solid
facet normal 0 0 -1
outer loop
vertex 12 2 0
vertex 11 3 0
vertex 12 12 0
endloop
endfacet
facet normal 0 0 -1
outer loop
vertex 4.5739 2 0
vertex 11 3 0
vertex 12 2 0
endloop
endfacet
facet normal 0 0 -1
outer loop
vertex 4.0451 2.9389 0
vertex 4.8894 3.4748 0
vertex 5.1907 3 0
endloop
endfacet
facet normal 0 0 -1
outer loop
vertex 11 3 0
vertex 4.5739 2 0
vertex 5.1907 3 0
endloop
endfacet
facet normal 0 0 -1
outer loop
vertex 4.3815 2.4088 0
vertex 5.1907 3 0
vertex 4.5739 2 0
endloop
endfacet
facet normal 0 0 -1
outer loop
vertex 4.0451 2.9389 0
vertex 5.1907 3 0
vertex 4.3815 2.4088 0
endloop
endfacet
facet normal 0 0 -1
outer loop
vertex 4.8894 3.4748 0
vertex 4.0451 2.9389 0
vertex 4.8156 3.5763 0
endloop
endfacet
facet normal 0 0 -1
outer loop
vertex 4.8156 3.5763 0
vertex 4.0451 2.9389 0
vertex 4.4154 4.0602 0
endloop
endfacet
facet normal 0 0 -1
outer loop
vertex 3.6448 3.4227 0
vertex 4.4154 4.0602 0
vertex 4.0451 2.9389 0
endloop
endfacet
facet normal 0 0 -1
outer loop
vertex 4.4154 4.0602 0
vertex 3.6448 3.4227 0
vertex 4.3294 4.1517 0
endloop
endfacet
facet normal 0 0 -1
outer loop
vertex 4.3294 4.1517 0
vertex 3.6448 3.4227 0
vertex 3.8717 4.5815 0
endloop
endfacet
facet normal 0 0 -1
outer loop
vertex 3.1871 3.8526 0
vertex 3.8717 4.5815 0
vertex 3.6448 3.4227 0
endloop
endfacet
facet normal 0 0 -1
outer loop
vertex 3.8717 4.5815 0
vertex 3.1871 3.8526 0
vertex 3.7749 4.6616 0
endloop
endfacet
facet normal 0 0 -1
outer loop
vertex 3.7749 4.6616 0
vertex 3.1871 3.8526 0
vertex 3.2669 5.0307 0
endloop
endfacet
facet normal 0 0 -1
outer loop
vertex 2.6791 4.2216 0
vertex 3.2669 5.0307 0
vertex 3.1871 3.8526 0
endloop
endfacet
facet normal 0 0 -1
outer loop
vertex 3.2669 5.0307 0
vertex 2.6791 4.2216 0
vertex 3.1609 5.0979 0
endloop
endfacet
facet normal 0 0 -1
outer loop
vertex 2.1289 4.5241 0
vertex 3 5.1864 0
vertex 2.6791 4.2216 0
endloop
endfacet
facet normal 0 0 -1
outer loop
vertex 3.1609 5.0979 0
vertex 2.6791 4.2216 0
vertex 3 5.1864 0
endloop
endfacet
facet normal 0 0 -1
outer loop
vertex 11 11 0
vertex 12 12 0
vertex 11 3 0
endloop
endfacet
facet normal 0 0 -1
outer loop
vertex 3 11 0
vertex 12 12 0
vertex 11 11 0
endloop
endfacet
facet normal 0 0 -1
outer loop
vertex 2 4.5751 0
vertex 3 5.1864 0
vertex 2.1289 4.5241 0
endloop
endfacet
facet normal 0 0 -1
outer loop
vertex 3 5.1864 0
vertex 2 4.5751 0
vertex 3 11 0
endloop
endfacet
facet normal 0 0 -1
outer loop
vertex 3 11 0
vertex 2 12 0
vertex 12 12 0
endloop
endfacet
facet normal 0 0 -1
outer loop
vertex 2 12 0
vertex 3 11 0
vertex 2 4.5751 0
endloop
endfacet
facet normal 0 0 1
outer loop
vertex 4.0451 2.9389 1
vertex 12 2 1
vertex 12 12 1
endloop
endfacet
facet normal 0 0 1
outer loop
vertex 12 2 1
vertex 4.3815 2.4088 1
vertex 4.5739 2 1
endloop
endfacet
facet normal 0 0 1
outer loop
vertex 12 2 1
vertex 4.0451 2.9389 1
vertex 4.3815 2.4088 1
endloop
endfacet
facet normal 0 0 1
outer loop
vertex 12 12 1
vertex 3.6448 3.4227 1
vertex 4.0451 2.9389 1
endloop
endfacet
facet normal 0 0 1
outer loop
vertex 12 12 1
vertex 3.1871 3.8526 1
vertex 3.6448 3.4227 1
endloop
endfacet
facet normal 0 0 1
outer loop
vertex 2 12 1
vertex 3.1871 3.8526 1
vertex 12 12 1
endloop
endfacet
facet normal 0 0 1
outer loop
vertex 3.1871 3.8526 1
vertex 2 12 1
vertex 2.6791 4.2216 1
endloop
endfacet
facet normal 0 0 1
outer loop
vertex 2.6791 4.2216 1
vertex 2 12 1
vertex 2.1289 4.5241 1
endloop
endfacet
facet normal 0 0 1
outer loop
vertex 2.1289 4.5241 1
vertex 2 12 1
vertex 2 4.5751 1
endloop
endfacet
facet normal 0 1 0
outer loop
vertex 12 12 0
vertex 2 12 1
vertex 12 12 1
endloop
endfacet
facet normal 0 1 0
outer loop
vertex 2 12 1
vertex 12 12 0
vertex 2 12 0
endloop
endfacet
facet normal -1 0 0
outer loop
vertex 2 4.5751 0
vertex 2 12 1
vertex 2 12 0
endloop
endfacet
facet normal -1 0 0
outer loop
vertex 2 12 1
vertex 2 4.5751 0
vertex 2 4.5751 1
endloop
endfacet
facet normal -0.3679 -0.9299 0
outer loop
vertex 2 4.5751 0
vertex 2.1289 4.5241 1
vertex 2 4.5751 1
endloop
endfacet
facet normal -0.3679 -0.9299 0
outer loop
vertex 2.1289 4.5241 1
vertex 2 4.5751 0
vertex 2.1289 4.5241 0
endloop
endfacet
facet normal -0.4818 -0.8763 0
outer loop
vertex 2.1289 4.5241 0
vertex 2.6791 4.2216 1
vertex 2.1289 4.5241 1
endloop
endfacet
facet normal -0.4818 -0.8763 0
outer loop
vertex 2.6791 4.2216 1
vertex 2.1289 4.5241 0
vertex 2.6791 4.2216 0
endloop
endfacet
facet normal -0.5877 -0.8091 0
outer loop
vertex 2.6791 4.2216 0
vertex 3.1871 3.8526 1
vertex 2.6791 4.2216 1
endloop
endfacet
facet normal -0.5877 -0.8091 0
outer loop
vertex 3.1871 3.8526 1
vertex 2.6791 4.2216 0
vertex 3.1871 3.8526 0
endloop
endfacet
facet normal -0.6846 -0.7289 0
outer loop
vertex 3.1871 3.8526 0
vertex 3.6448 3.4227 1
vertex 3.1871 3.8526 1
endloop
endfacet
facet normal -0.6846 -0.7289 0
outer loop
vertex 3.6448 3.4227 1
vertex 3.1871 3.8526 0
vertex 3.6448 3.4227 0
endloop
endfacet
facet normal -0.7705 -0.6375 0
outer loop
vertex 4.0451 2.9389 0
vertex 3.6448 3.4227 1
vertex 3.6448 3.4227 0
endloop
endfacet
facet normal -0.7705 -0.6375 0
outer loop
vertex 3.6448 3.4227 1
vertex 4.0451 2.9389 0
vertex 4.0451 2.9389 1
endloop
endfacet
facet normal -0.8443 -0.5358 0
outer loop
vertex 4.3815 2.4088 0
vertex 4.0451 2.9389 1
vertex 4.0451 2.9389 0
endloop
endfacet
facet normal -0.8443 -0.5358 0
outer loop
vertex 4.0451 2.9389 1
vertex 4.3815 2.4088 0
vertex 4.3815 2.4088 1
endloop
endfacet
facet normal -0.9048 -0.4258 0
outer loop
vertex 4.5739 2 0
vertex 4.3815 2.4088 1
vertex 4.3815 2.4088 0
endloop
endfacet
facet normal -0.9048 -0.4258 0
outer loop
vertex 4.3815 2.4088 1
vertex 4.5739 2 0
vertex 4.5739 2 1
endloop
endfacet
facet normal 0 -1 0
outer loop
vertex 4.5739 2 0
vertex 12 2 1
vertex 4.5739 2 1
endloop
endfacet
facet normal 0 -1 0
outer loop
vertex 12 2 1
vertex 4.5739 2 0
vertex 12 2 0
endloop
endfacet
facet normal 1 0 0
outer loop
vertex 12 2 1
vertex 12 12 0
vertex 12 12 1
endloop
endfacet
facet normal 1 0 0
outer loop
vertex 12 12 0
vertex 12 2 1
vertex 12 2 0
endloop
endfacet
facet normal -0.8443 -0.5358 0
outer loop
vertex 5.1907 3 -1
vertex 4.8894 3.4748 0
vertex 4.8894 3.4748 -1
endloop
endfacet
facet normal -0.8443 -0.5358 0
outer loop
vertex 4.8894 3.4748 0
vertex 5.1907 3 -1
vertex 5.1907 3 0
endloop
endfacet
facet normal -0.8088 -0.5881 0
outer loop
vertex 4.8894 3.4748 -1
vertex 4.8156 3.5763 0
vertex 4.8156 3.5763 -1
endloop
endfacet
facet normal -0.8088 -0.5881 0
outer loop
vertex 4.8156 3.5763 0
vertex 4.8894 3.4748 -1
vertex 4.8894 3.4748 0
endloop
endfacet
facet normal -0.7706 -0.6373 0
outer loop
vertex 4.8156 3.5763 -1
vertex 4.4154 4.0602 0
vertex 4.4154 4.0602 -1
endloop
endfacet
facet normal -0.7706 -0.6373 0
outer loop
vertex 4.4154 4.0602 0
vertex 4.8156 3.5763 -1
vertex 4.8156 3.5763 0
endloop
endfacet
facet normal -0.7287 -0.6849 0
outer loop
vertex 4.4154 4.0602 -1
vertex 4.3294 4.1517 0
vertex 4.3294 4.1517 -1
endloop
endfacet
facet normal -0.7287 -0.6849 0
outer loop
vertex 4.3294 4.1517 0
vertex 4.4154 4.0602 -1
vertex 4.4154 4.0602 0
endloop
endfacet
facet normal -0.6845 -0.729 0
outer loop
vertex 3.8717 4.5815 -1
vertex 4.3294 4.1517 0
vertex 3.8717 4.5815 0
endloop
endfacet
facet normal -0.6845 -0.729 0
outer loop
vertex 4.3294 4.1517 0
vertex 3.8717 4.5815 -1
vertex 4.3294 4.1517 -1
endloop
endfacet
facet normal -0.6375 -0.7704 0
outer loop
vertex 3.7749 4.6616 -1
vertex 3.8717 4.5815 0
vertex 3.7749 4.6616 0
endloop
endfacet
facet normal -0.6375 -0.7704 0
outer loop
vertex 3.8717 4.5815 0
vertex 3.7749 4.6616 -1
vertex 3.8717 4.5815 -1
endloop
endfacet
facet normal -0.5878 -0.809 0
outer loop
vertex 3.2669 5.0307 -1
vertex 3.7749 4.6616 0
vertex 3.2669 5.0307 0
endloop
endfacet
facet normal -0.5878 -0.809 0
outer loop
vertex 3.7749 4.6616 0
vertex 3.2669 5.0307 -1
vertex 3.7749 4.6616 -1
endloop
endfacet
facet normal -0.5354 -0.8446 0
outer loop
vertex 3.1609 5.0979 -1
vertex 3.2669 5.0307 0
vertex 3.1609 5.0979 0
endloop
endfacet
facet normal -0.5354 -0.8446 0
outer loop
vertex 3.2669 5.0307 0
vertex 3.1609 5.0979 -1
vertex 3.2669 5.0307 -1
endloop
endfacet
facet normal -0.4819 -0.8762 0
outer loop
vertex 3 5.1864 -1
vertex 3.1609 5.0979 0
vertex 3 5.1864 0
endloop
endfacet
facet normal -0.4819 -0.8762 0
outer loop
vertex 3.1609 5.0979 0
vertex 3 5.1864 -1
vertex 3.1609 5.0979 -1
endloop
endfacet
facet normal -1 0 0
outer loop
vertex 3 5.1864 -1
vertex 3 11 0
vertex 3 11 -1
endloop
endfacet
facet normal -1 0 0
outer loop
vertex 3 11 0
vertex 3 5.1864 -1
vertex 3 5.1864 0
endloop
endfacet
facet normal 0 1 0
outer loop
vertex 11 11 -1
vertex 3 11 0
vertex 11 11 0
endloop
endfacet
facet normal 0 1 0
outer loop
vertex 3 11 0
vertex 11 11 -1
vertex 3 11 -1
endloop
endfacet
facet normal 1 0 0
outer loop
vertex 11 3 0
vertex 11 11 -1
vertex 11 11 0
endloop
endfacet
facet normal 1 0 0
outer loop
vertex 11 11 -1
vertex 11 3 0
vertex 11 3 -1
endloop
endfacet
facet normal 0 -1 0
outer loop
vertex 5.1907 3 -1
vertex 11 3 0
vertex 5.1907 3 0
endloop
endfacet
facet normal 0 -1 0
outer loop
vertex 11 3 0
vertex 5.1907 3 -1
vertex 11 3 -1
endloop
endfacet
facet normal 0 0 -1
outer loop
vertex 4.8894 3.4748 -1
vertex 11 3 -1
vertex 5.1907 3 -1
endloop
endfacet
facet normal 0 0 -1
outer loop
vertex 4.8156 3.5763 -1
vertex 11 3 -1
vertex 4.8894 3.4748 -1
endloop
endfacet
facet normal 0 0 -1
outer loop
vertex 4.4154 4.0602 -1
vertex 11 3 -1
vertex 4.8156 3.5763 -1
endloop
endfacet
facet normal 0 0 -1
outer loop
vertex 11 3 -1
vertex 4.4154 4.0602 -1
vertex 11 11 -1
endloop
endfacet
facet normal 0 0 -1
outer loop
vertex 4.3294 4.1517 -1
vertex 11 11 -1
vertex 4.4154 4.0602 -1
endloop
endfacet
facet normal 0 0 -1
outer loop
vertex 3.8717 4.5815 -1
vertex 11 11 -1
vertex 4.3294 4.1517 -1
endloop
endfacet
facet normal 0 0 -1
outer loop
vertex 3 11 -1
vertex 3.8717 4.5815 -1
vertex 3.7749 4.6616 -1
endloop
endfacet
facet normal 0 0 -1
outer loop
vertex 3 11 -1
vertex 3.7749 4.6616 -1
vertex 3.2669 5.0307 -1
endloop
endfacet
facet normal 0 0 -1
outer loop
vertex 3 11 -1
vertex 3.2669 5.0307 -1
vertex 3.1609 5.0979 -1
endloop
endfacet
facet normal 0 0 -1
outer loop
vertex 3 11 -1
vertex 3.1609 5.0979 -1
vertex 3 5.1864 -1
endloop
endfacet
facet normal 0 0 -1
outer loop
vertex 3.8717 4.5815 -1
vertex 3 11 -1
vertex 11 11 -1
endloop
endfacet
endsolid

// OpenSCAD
$fn=50;
union(){
linear_extrude(1){
difference(){
difference(){
translate([2,2])square(10);
circle(5);}

color("red")offset(-1)difference(){
translate([2,2])square(10);
circle(5);}
}}
color("red")linear_extrude(2, center = true){


offset(-1)difference(){
translate([2,2])square(10);
circle(5);}
}}
